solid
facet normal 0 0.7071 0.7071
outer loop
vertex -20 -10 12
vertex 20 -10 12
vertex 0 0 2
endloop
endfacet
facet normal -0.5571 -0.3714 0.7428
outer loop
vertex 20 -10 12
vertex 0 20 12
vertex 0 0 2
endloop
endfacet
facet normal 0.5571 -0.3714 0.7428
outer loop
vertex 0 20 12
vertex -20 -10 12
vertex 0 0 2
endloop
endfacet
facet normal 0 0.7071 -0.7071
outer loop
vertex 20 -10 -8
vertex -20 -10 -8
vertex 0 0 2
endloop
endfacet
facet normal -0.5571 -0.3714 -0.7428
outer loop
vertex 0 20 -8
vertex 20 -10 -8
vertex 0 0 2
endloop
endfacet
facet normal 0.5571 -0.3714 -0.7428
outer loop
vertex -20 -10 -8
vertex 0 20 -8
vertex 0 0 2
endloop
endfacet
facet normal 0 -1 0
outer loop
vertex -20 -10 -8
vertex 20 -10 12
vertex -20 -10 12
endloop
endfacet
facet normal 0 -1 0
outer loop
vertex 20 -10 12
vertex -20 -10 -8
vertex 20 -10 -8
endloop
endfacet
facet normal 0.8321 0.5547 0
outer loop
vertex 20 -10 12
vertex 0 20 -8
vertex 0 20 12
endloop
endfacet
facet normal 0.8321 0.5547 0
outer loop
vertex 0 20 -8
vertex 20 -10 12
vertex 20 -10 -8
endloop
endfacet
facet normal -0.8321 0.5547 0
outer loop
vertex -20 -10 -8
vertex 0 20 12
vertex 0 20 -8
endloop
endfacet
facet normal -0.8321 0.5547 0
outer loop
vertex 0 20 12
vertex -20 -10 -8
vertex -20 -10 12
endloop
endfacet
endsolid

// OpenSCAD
// translate([20, 0, 0])
translate([0, 0, 2]) scale(10) polyhedron(
    points=[
        [ 0, 0,  0],

        [-2,-1, +1],
        [+2,-1, +1],
        [ 0,+2, +1],

        [-2,-1, -1],
        [+2,-1, -1],
        [ 0,+2, -1],
    ],
    faces=[
        [0, 2, 1],
        [0, 3, 2],
        [0, 1, 3],

        [0, 4, 5],
        [0, 5, 6],
        [0, 6, 4],

        [1, 2, 5, 4],
        [2, 3, 6, 5],
        [3, 1, 4, 6],
    ]
);
